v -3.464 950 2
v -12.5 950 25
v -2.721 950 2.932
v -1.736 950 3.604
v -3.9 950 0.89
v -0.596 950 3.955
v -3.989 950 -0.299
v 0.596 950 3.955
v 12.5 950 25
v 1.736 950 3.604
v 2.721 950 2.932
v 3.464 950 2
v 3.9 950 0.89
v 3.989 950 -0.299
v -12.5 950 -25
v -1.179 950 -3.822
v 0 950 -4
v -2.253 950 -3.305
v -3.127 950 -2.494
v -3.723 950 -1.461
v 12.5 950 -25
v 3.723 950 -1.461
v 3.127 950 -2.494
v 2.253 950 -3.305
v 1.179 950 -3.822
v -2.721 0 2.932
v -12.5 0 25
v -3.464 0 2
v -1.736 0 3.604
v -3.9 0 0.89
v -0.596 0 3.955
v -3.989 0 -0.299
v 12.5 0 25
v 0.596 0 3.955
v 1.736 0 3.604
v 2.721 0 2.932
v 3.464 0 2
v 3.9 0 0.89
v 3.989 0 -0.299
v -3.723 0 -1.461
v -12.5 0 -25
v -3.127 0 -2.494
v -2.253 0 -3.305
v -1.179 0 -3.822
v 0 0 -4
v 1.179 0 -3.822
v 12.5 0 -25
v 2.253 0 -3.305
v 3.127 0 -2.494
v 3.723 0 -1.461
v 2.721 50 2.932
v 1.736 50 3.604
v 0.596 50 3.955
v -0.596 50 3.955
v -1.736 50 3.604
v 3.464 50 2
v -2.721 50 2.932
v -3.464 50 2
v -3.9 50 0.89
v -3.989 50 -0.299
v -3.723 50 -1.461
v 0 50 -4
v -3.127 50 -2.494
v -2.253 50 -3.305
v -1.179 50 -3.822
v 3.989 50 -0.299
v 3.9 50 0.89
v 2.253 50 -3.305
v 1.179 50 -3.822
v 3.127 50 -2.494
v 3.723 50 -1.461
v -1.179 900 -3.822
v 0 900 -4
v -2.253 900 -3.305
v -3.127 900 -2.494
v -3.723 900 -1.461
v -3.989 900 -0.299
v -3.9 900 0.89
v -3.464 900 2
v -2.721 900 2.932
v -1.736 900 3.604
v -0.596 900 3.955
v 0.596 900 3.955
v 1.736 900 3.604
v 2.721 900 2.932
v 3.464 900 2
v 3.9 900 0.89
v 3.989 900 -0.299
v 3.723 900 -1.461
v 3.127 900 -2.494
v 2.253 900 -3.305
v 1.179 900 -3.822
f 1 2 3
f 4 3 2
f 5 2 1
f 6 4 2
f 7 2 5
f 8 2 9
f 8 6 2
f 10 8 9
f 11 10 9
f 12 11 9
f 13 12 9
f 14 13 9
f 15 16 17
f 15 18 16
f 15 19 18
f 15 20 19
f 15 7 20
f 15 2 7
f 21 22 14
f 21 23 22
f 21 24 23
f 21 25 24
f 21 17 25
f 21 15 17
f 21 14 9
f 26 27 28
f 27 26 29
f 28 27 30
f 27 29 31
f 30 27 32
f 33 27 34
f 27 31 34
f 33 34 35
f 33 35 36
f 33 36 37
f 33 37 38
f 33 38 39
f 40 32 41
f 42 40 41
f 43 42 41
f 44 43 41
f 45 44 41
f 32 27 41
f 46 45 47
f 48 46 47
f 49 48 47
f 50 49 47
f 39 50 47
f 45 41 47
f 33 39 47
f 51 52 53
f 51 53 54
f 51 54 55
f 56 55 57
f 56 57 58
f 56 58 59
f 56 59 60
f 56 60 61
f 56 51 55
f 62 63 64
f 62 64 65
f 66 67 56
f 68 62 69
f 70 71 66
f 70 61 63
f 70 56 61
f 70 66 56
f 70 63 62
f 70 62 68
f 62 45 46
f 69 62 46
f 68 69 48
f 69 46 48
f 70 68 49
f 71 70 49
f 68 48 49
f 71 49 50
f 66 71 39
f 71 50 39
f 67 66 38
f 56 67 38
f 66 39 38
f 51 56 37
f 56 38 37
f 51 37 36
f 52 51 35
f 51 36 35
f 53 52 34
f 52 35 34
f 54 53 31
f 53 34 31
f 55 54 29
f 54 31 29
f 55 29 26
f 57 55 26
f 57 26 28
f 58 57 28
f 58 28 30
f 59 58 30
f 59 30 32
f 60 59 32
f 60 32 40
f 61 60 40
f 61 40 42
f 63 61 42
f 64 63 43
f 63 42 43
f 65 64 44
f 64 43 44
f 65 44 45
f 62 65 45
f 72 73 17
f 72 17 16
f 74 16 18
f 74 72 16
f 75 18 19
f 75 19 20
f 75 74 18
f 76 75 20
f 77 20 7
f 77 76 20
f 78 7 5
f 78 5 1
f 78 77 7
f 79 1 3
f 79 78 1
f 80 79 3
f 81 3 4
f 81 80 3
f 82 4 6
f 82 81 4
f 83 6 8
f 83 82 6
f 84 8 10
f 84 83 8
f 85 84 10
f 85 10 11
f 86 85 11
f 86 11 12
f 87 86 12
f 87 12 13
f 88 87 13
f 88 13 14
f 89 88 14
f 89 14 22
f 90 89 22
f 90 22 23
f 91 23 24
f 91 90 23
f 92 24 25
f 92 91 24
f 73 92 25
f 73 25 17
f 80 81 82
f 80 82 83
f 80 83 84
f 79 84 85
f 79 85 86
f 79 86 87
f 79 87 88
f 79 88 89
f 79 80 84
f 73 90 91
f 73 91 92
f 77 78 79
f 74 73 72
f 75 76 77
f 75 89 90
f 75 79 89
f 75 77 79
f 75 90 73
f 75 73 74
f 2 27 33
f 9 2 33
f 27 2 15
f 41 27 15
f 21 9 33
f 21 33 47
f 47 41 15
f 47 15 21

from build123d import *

# Parameters (mm, degrees)
SKETCH_1_W          = 25
SKETCH_1_H          = 50
EXTRUDE_1_DEPTH     = 950
SKETCH_2_R          = 4
CUT_EXTRUDE_1_DEPTH = 50
CUT_EXTRUDE_START   = -50
SKETCH_3_R          = 4
CUT_EXTRUDE_2_DEPTH = 50


with BuildPart() as part:
    # Эскиз1 → Бобышка-Вытянуть1 (new body)
    with BuildSketch(Plane(origin=(0, 0, 0), x_dir=(1, 0, 0), z_dir=(0, 1, 0))):
        Rectangle(SKETCH_1_W, SKETCH_1_H)
    extrude(amount=EXTRUDE_1_DEPTH)

    # Эскиз2 → Вырез-Вытянуть1 (cut)
    with BuildSketch(Plane.XZ):
        with Locations(Location((0, 0, 0), (0, 0, 270))):
            Circle(SKETCH_2_R)
    extrude(amount=-CUT_EXTRUDE_1_DEPTH, mode=Mode.SUBTRACT)

    # Эскиз3 → Вырез-Вытянуть2 (cut)
    with BuildSketch(Plane(origin=(0, 950, 0), x_dir=(1, 0, 0), z_dir=(0, 1, 0)).offset(CUT_EXTRUDE_START)):
        with Locations(Location((0, 0, 0), (0, 0, 90))):
            Circle(SKETCH_3_R)
    extrude(amount=CUT_EXTRUDE_2_DEPTH, mode=Mode.SUBTRACT)


solid = part.part
